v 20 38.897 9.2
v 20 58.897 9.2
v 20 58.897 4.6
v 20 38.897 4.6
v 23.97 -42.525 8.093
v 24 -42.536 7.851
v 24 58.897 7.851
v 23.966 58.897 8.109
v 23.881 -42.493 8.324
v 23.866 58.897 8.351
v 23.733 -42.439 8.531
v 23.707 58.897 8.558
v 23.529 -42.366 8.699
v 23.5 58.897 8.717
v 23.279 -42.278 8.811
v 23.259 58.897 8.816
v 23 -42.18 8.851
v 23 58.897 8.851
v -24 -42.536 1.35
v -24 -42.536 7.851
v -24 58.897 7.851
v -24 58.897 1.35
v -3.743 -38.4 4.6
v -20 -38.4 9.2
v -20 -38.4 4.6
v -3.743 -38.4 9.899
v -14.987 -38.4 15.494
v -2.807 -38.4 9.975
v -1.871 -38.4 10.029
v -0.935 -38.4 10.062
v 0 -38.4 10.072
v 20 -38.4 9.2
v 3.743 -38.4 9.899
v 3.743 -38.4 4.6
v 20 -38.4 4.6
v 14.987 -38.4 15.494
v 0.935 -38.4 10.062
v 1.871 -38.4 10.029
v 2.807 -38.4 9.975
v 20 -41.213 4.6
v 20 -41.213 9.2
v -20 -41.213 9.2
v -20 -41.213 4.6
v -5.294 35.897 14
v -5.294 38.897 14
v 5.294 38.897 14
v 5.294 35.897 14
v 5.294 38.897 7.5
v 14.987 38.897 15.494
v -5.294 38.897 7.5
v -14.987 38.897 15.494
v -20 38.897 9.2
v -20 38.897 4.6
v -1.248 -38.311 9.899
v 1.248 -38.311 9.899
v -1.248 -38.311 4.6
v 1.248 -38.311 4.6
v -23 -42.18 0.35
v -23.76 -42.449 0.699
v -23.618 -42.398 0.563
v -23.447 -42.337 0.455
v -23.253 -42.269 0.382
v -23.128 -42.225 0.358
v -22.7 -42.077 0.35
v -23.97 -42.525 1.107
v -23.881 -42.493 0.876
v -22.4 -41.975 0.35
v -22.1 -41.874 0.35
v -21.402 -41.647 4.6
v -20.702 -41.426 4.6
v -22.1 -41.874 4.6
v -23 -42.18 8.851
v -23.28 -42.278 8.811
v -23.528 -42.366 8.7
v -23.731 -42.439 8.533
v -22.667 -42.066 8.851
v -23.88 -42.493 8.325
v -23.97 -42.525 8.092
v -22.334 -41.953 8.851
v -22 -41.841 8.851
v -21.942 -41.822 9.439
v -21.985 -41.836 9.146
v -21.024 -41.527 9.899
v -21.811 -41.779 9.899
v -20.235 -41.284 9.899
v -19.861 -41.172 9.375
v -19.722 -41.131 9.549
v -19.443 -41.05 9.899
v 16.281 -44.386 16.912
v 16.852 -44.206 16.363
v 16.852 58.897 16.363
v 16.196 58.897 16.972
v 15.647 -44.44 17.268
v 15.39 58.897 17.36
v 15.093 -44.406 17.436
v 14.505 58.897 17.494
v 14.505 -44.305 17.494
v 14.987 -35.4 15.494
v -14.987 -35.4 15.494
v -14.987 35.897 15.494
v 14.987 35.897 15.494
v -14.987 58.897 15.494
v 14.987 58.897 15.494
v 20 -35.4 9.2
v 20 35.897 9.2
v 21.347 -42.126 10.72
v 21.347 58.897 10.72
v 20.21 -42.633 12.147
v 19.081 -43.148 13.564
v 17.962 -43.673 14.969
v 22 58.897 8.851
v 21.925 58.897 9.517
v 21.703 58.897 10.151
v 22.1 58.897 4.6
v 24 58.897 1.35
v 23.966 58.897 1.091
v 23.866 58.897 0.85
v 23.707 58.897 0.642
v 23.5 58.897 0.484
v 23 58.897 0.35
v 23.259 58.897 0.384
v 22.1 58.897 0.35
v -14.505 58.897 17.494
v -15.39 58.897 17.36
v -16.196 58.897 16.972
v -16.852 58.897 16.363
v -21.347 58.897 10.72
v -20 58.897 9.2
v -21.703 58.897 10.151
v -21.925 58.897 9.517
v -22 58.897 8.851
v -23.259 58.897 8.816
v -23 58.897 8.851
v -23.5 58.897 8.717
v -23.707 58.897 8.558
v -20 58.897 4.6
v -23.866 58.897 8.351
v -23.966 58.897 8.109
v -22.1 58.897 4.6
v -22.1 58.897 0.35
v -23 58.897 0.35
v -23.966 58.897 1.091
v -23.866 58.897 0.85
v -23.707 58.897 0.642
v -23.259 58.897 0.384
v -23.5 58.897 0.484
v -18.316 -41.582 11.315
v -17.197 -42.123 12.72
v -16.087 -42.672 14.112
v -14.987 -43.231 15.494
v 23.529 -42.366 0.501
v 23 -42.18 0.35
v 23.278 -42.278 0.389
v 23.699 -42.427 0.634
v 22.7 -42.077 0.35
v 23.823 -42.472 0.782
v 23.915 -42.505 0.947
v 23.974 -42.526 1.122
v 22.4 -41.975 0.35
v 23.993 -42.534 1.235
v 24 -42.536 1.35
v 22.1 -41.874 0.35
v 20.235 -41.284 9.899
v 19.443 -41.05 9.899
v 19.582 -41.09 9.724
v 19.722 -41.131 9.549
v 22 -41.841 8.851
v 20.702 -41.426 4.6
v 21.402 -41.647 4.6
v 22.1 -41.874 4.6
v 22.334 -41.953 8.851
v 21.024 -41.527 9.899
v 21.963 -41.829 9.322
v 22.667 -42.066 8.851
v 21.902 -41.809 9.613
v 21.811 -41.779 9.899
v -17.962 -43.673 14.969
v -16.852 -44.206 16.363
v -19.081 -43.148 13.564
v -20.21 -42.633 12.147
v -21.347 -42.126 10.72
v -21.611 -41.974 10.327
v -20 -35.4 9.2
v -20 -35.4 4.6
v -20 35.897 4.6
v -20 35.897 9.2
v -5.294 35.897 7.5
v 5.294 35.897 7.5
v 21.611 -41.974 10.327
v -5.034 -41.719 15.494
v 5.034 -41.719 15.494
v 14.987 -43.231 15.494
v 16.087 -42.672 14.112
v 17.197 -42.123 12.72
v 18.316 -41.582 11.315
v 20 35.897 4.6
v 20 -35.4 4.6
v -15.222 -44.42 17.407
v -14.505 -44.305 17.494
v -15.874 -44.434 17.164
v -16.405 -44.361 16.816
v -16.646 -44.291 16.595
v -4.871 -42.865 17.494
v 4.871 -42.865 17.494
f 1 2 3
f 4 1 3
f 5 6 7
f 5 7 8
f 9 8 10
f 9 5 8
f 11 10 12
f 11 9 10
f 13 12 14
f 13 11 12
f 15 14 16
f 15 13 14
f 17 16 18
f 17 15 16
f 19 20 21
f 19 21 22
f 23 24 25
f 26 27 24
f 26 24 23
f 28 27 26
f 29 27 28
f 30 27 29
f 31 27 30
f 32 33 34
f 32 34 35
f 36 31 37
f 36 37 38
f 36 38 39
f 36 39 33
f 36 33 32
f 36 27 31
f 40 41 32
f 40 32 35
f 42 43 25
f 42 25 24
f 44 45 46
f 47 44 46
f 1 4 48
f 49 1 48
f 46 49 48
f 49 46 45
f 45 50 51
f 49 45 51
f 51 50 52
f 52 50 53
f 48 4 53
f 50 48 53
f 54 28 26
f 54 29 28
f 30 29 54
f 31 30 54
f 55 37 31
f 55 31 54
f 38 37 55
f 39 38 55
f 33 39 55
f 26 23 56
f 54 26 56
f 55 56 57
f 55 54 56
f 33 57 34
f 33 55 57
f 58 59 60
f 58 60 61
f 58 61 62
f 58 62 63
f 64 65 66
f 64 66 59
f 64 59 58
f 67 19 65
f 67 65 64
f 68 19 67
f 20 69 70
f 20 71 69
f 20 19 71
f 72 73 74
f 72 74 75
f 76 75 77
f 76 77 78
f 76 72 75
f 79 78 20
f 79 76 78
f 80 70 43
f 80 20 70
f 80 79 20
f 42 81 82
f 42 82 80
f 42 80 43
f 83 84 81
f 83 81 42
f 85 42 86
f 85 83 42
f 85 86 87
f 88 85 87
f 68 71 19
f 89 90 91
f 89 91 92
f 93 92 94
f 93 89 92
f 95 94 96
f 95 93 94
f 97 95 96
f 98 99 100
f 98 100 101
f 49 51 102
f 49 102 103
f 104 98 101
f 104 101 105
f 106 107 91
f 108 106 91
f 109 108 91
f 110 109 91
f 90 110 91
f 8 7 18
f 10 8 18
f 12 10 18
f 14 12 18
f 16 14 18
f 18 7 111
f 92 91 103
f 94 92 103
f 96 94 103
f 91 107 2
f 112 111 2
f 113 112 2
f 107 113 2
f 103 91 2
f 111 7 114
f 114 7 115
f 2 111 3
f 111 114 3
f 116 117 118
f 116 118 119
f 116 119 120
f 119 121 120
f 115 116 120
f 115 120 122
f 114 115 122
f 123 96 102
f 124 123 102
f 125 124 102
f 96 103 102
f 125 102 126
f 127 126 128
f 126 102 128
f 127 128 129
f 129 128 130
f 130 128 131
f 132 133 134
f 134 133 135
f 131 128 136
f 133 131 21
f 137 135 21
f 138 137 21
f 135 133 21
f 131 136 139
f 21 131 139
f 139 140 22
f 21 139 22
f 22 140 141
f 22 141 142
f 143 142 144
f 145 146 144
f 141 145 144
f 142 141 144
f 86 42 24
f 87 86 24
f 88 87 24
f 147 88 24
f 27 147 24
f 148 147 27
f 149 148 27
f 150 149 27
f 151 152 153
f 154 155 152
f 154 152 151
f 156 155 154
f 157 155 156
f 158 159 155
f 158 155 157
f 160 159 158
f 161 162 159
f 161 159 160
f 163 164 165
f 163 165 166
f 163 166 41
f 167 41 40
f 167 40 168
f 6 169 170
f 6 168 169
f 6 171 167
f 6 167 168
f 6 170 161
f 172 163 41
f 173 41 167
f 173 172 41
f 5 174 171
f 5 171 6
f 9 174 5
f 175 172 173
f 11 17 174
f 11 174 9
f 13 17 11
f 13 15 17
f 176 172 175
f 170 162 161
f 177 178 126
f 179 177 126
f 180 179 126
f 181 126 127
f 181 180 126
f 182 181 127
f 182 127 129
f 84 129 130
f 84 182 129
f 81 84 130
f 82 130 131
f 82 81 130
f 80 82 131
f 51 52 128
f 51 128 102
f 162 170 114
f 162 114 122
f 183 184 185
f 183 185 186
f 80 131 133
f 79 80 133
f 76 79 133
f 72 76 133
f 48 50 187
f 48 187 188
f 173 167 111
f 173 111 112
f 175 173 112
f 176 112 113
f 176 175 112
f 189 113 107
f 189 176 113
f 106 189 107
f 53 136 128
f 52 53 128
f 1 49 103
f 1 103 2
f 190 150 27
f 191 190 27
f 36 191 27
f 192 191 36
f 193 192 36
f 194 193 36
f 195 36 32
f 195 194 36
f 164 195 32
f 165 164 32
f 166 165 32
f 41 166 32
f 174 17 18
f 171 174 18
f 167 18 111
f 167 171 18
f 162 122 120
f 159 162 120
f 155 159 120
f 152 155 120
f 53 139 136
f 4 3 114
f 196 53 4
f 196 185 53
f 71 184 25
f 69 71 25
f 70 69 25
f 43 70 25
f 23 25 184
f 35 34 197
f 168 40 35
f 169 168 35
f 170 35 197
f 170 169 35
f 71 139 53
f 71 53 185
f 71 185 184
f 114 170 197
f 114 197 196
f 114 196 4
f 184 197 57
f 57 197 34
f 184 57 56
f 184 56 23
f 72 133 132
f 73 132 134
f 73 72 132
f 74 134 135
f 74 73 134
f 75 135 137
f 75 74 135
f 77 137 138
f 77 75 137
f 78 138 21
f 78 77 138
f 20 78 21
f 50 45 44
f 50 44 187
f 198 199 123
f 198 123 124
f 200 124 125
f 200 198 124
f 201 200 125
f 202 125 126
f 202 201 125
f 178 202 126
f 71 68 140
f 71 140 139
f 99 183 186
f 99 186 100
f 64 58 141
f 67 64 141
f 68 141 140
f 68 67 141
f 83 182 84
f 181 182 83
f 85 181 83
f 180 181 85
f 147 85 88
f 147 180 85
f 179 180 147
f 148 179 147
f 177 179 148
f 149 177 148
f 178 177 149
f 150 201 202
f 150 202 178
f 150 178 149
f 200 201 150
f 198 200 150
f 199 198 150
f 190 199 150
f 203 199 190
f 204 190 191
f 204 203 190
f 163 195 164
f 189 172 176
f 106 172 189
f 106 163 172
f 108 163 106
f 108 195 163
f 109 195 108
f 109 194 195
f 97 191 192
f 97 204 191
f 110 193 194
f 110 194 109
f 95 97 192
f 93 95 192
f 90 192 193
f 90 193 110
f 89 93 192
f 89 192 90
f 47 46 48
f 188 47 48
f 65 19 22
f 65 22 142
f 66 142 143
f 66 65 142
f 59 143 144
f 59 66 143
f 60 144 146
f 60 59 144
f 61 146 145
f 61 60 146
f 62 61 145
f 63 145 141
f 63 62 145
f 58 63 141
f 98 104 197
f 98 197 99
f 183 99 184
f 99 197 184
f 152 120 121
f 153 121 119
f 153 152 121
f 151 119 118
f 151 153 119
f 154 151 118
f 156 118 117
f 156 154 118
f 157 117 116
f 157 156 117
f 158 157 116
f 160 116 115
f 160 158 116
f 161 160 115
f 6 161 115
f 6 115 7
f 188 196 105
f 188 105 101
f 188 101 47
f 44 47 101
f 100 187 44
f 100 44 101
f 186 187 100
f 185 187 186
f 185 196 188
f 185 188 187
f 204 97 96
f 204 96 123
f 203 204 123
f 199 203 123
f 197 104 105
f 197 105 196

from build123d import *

# Parameters (mm, degrees)
EXTRUDE_1_DEPTH     = 58.89737674
EXTRUDE_START       = 38.399597665
EXTRUDE_2_DEPTH     = 38.399597665
EXTRUDE_3_REACH     = 66.893
SKETCH_3_W          = 44.2
SKETCH_3_H          = 3
EXTRUDE_4_REACH     = 66.893
SKETCH_4_W          = 44.2
SKETCH_4_H          = 3
CUT_EXTRUDE_START   = -77.29697691
CUT_EXTRUDE_1_DEPTH = 77.29697691
SKETCH_6_W          = 10.588620777
SKETCH_6_H          = 6.5
CUT_EXTRUDE_2_DEPTH = 3
EXTRUDE_START_2     = 15
EXTRUDE_5_DEPTH     = 15


with BuildPart() as part:
    # 草图1 → 凸台-拉伸1 (new body)
    with BuildSketch(Plane(origin=(0, 0, 0), x_dir=(1, 0, 0), z_dir=(0, 1, 0))):
        with BuildLine():
            Line((21.346642729, -10.719560241), (16.852020459, -16.362765964))
            ThreePointArc((16.852020459, -16.362765964), (15.807857901, -17.196247295), (14.505374257, -17.493741725))
            Line((14.505374257, -17.493741725), (-14.505381202, -17.493741725))
            ThreePointArc((-14.505381202, -17.493741725), (-15.807864846, -17.196247295), (-16.852027404, -16.362765964))
            Line((-16.852027404, -16.362765964), (-21.346649674, -10.719560241))
            ThreePointArc((-21.346649674, -10.719560241), (-21.831958504, -9.840501001), (-22.000003473, -8.850536003))
            Line((-22.000003473, -8.850536003), (-23.000003473, -8.850536003))
            ThreePointArc((-23.000003473, -8.850536003), (-23.707110254, -8.557642784), (-24.000003473, -7.850536003))
            Line((-24.000003473, -7.850536003), (-24.000003473, -1.349569462))
            ThreePointArc((-24.000003473, -1.349569462), (-23.707110254, -0.642462681), (-23.000003473, -0.349569462))
            Line((-23.000003473, -0.349569462), (-22.100003473, -0.349569462))
            Line((-22.100003473, -0.349569462), (-22.100003473, -4.600052733))
            Line((-22.100003473, -4.600052733), (-22.000003473, -4.600052733))
            Line((-22.000003473, -4.600052733), (-20.000003473, -4.600052733))
            Line((-20.000003473, -4.600052733), (-20.000003473, -9.200105465))
            Line((-20.000003473, -9.200105465), (-14.987335304, -15.493741725))
            Line((-14.987335304, -15.493741725), (14.987328359, -15.493741725))
            Line((14.987328359, -15.493741725), (19.999996527, -9.200105465))
            Line((19.999996527, -9.200105465), (19.999996527, -4.600052733))
            Line((19.999996527, -4.600052733), (21.999996527, -4.600052733))
            Line((21.999996527, -4.600052733), (22.099996527, -4.600052733))
            Line((22.099996527, -4.600052733), (22.099996527, -0.349569462))
            Line((22.099996527, -0.349569462), (22.999996527, -0.349569462))
            ThreePointArc((22.999996527, -0.349569462), (23.707103309, -0.642462681), (23.999996527, -1.349569462))
            Line((23.999996527, -1.349569462), (23.999996527, -7.850536003))
            ThreePointArc((23.999996527, -7.850536003), (23.707103309, -8.557642784), (22.999996527, -8.850536003))
            Line((22.999996527, -8.850536003), (21.999996527, -8.850536003))
            ThreePointArc((21.999996527, -8.850536003), (21.831951559, -9.840501001), (21.346642729, -10.719560241))
        make_face()
    extrude(amount=EXTRUDE_1_DEPTH)

    # 草图2 → 凸台-拉伸2 (add)
    with BuildSketch(Plane.XZ.offset(EXTRUDE_START)):
        with BuildLine():
            Line((22.999996527, 8.850536003), (21.999996527, 8.850536003))
            ThreePointArc((21.999996527, 8.850536003), (21.831951559, 9.840501001), (21.346642729, 10.719560241))
            Line((21.346642729, 10.719560241), (16.852020459, 16.362765964))
            ThreePointArc((16.852020459, 16.362765964), (15.807857901, 17.196247295), (14.505374257, 17.493741725))
            Line((14.505374257, 17.493741725), (-14.505381202, 17.493741725))
            ThreePointArc((-14.505381202, 17.493741725), (-15.807864846, 17.196247295), (-16.852027404, 16.362765964))
            Line((-16.852027404, 16.362765964), (-21.346649674, 10.719560241))
            ThreePointArc((-21.346649674, 10.719560241), (-21.831958504, 9.840501001), (-22.000003473, 8.850536003))
            Line((-22.000003473, 8.850536003), (-23.000003473, 8.850536003))
            ThreePointArc((-23.000003473, 8.850536003), (-23.707110254, 8.557642784), (-24.000003473, 7.850536003))
            Line((-24.000003473, 7.850536003), (-24.000003473, 1.349569462))
            ThreePointArc((-24.000003473, 1.349569462), (-23.707110254, 0.642462681), (-23.000003473, 0.349569462))
            Line((-23.000003473, 0.349569462), (-22.100003473, 0.349569462))
            Line((-22.100003473, 0.349569462), (-22.100003473, 4.600052733))
            Line((-22.100003473, 4.600052733), (-20.000003473, 4.600052733))
            Line((-20.000003473, 4.600052733), (-20.000003473, 9.200105465))
            Line((-20.000003473, 9.200105465), (-14.987335304, 15.493741725))
            Line((-14.987335304, 15.493741725), (14.987328359, 15.493741725))
            Line((14.987328359, 15.493741725), (19.999996527, 9.200105465))
            Line((19.999996527, 9.200105465), (19.999996527, 4.600052733))
            Line((19.999996527, 4.600052733), (22.099996527, 4.600052733))
            Line((22.099996527, 4.600052733), (22.099996527, 0.349569462))
            Line((22.099996527, 0.349569462), (22.999996527, 0.349569462))
            ThreePointArc((22.999996527, 0.349569462), (23.707103309, 0.642462681), (23.999996527, 1.349569462))
            Line((23.999996527, 1.349569462), (23.999996527, 7.850536003))
            ThreePointArc((23.999996527, 7.850536003), (23.707103309, 8.557642784), (22.999996527, 8.850536003))
        make_face()
    extrude(amount=-EXTRUDE_2_DEPTH)

    # 凸台-拉伸3: up to this face of the body (flat: up to its plane)
    extrude_3_end = Plane(part.part.faces().sort_by_distance((-3.473e-06, 10.248889538, 17.493741725))[0])
    # 草图3 → 凸台-拉伸3 (add, up to the picked face)
    with BuildSketch(Plane(origin=(0, 0, 4.600052733), x_dir=(-1, 0, 0), z_dir=(0, 0, -1)), mode=Mode.PRIVATE) as extrude_3_sk1:
        with Locations((3.473e-06, -36.899597665)):
            Rectangle(SKETCH_3_W, SKETCH_3_H)
    extrude_3_tool1 = split(extrude(extrude_3_sk1.sketch, amount=-EXTRUDE_3_REACH, mode=Mode.PRIVATE), bisect_by=extrude_3_end, keep=Keep.BOTH, mode=Mode.PRIVATE)
    add(extrude_3_tool1.solids().sort_by(Axis((-3e-06, -36.899598, 4.600053), (0, 0, 1)))[0])

    # 凸台-拉伸4: up to this face of the body (flat: up to its plane)
    extrude_4_end = Plane(part.part.faces().sort_by_distance((-3.473e-06, 9.499837909, 17.493741725))[0])
    # 草图4 → 凸台-拉伸4 (add, up to the picked face)
    with BuildSketch(Plane(origin=(0, 0, 4.600052733), x_dir=(-1, 0, 0), z_dir=(0, 0, -1)), mode=Mode.PRIVATE) as extrude_4_sk1:
        with Locations((3.473e-06, 37.397379245)):
            Rectangle(SKETCH_4_W, SKETCH_4_H)
    extrude_4_tool1 = split(extrude(extrude_4_sk1.sketch, amount=-EXTRUDE_4_REACH, mode=Mode.PRIVATE), bisect_by=extrude_4_end, keep=Keep.BOTH, mode=Mode.PRIVATE)
    add(extrude_4_tool1.solids().sort_by(Axis((-3e-06, 37.397379, 4.600053), (0, 0, 1)))[0])

    # 草图5 → 切除-拉伸1 (cut)
    with BuildSketch(Plane(origin=(0, 38.897379245, 0), x_dir=(1, 0, 0), z_dir=(0, 1, 0)).offset(CUT_EXTRUDE_START)):
        with BuildLine():
            Line((-22.100003473, -8.850536003), (-22.100003473, -17.493741725))
            Line((-22.100003473, -17.493741725), (-14.505381202, -17.493741725))
            ThreePointArc((-14.505381202, -17.493741725), (-15.807864846, -17.196247295), (-16.852027404, -16.362765964))
            Line((-16.852027404, -16.362765964), (-21.346649674, -10.719560241))
            ThreePointArc((-21.346649674, -10.719560241), (-21.831958504, -9.840501001), (-22.000003473, -8.850536003))
            Line((-22.000003473, -8.850536003), (-22.100003473, -8.850536003))
        make_face()
        with BuildLine():
            Line((14.505374257, -17.493741725), (22.099996527, -17.493741725))
            Line((22.099996527, -17.493741725), (22.099996527, -8.850536003))
            Line((22.099996527, -8.850536003), (21.999996527, -8.850536003))
            ThreePointArc((21.999996527, -8.850536003), (21.831951559, -9.840501001), (21.346642729, -10.719560241))
            Line((21.346642729, -10.719560241), (16.852020459, -16.362765964))
            ThreePointArc((16.852020459, -16.362765964), (15.807857901, -17.196247295), (14.505374257, -17.493741725))
        make_face()
    extrude(amount=CUT_EXTRUDE_1_DEPTH, mode=Mode.SUBTRACT)

    # 草图6 → 切除-拉伸2 (cut)
    with BuildSketch(Plane(origin=(0, 38.897379245, 0), x_dir=(1, 0, 0), z_dir=(0, 1, 0))):
        with Locations((-3.3e-06, -10.750052671)):
            Rectangle(SKETCH_6_W, SKETCH_6_H)
    extrude(amount=-CUT_EXTRUDE_2_DEPTH, mode=Mode.SUBTRACT)

    # 草图7 → 凸台-拉伸5 (add)
    with BuildSketch(Plane(origin=(0, -38.399597665, 0), x_dir=(-1, 0, 0), z_dir=(0, -1, 0)).offset(EXTRUDE_START_2)):
        with BuildLine():
            Line((20.000003473, -4.600052733), (20.000003473, -9.200105465))
            Line((20.000003473, -9.200105465), (14.987335304, -15.493741725))
            Line((14.987335304, -15.493741725), (-14.987328359, -15.493741725))
            Line((-14.987328359, -15.493741725), (-19.999996527, -9.200105465))
            Line((-19.999996527, -9.200105465), (-19.999996527, -4.600052733))
            Line((-19.999996527, -4.600052733), (-21.999996527, -4.600052733))
            Line((-21.999996527, -4.600052733), (-22.099996527, -4.600052733))
            Line((-22.099996527, -4.600052733), (-22.099996527, -0.349569462))
            Line((-22.099996527, -0.349569462), (-22.999996527, -0.349569462))
            ThreePointArc((-22.999996527, -0.349569462), (-23.707103309, -0.642462681), (-23.999996527, -1.349569462))
            Line((-23.999996527, -1.349569462), (-23.999996527, -7.850536003))
            ThreePointArc((-23.999996527, -7.850536003), (-23.707103309, -8.557642784), (-22.999996527, -8.850536003))
            Line((-22.999996527, -8.850536003), (-21.999996527, -8.850536003))
            ThreePointArc((-21.999996527, -8.850536003), (-21.831951559, -9.840501001), (-21.346642729, -10.719560241))
            Line((-21.346642729, -10.719560241), (-16.852020459, -16.362765964))
            ThreePointArc((-16.852020459, -16.362765964), (-15.807857901, -17.196247295), (-14.505374257, -17.493741725))
            Line((-14.505374257, -17.493741725), (14.505381202, -17.493741725))
            ThreePointArc((14.505381202, -17.493741725), (15.807864846, -17.196247295), (16.852027404, -16.362765964))
            Line((16.852027404, -16.362765964), (21.346649674, -10.719560241))
            ThreePointArc((21.346649674, -10.719560241), (21.831958504, -9.840501001), (22.000003473, -8.850536003))
            Line((22.000003473, -8.850536003), (23.000003473, -8.850536003))
            ThreePointArc((23.000003473, -8.850536003), (23.707110254, -8.557642784), (24.000003473, -7.850536003))
            Line((24.000003473, -7.850536003), (24.000003473, -1.349569462))
            ThreePointArc((24.000003473, -1.349569462), (23.707110254, -0.642462681), (23.000003473, -0.349569462))
            Line((23.000003473, -0.349569462), (22.100003473, -0.349569462))
            Line((22.100003473, -0.349569462), (22.100003473, -4.600052733))
            Line((22.100003473, -4.600052733), (22.000003473, -4.600052733))
            Line((22.000003473, -4.600052733), (20.000003473, -4.600052733))
        make_face()
    extrude(amount=-EXTRUDE_5_DEPTH)

    # 草图8 → 切除-旋转1 (revolve, cut)
    with BuildSketch(Plane(origin=(0, 0, 0), x_dir=(0, 0, -1), z_dir=(1, 0, 0))):
        Polygon((-9.89924439, -38.299597665), (-20.291549236, -44.299597665), (-20.291549236, -55.801852499), (11.09144377, -55.801852499), (11.09144377, -44.299597665), (0.699138925, -38.299597665), align=None)
    revolve(axis=Axis((0, -108.399597665, 9.89924439), (0, 0, -1)), mode=Mode.SUBTRACT)


solid = part.part
